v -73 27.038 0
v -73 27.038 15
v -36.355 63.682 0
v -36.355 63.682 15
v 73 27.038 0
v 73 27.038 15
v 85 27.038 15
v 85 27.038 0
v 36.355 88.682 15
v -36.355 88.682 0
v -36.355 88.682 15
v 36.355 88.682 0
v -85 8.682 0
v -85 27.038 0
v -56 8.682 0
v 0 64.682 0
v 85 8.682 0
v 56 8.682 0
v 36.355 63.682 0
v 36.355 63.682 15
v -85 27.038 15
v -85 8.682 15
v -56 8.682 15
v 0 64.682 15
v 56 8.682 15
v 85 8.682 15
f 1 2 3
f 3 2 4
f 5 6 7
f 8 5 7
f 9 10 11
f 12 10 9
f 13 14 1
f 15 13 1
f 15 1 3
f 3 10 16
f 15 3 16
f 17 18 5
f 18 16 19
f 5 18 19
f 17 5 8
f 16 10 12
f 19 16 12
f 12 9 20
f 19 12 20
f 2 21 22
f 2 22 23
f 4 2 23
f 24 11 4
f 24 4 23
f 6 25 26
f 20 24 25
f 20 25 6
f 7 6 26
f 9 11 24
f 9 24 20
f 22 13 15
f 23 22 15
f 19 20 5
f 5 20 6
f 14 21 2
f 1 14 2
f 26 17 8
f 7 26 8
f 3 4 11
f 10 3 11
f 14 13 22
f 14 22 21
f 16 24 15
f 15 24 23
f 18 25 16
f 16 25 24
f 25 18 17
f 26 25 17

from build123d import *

# Parameters (mm, degrees)
F1_W     = 170
F1_H     = 80
F2_DEPTH = 15
F4_DEPTH = 15
F6_DEPTH = 25


with BuildPart() as f2:
    # F1 (on Top) → F2 (new body)
    with BuildSketch(Plane.XY):
        with Locations((0, 48.682307)):
            Rectangle(F1_W, F1_H)
    extrude(amount=F2_DEPTH)

    # F3 (on face) → F4 (cut)
    with BuildSketch(Plane.XY.offset(15)):
        Polygon((0, 64.682307), (-56, 8.682307), (56, 8.682307), align=None)
    extrude(amount=-F4_DEPTH, mode=Mode.SUBTRACT)

    # F5 (on face) → F6 (cut)
    with BuildSketch(Plane.XY.offset(15)):
        Polygon((-85, 88.682307), (-85, 27.037646), (-73, 27.037646), (-36.355339, 63.682307), (-36.355339, 88.682307), align=None)
        Polygon((85, 88.682307), (36.355339, 88.682307), (36.355339, 63.682307), (73, 27.037646), (85, 27.037646), align=None)
    extrude(amount=-F6_DEPTH, mode=Mode.SUBTRACT)


solid = f2.part
